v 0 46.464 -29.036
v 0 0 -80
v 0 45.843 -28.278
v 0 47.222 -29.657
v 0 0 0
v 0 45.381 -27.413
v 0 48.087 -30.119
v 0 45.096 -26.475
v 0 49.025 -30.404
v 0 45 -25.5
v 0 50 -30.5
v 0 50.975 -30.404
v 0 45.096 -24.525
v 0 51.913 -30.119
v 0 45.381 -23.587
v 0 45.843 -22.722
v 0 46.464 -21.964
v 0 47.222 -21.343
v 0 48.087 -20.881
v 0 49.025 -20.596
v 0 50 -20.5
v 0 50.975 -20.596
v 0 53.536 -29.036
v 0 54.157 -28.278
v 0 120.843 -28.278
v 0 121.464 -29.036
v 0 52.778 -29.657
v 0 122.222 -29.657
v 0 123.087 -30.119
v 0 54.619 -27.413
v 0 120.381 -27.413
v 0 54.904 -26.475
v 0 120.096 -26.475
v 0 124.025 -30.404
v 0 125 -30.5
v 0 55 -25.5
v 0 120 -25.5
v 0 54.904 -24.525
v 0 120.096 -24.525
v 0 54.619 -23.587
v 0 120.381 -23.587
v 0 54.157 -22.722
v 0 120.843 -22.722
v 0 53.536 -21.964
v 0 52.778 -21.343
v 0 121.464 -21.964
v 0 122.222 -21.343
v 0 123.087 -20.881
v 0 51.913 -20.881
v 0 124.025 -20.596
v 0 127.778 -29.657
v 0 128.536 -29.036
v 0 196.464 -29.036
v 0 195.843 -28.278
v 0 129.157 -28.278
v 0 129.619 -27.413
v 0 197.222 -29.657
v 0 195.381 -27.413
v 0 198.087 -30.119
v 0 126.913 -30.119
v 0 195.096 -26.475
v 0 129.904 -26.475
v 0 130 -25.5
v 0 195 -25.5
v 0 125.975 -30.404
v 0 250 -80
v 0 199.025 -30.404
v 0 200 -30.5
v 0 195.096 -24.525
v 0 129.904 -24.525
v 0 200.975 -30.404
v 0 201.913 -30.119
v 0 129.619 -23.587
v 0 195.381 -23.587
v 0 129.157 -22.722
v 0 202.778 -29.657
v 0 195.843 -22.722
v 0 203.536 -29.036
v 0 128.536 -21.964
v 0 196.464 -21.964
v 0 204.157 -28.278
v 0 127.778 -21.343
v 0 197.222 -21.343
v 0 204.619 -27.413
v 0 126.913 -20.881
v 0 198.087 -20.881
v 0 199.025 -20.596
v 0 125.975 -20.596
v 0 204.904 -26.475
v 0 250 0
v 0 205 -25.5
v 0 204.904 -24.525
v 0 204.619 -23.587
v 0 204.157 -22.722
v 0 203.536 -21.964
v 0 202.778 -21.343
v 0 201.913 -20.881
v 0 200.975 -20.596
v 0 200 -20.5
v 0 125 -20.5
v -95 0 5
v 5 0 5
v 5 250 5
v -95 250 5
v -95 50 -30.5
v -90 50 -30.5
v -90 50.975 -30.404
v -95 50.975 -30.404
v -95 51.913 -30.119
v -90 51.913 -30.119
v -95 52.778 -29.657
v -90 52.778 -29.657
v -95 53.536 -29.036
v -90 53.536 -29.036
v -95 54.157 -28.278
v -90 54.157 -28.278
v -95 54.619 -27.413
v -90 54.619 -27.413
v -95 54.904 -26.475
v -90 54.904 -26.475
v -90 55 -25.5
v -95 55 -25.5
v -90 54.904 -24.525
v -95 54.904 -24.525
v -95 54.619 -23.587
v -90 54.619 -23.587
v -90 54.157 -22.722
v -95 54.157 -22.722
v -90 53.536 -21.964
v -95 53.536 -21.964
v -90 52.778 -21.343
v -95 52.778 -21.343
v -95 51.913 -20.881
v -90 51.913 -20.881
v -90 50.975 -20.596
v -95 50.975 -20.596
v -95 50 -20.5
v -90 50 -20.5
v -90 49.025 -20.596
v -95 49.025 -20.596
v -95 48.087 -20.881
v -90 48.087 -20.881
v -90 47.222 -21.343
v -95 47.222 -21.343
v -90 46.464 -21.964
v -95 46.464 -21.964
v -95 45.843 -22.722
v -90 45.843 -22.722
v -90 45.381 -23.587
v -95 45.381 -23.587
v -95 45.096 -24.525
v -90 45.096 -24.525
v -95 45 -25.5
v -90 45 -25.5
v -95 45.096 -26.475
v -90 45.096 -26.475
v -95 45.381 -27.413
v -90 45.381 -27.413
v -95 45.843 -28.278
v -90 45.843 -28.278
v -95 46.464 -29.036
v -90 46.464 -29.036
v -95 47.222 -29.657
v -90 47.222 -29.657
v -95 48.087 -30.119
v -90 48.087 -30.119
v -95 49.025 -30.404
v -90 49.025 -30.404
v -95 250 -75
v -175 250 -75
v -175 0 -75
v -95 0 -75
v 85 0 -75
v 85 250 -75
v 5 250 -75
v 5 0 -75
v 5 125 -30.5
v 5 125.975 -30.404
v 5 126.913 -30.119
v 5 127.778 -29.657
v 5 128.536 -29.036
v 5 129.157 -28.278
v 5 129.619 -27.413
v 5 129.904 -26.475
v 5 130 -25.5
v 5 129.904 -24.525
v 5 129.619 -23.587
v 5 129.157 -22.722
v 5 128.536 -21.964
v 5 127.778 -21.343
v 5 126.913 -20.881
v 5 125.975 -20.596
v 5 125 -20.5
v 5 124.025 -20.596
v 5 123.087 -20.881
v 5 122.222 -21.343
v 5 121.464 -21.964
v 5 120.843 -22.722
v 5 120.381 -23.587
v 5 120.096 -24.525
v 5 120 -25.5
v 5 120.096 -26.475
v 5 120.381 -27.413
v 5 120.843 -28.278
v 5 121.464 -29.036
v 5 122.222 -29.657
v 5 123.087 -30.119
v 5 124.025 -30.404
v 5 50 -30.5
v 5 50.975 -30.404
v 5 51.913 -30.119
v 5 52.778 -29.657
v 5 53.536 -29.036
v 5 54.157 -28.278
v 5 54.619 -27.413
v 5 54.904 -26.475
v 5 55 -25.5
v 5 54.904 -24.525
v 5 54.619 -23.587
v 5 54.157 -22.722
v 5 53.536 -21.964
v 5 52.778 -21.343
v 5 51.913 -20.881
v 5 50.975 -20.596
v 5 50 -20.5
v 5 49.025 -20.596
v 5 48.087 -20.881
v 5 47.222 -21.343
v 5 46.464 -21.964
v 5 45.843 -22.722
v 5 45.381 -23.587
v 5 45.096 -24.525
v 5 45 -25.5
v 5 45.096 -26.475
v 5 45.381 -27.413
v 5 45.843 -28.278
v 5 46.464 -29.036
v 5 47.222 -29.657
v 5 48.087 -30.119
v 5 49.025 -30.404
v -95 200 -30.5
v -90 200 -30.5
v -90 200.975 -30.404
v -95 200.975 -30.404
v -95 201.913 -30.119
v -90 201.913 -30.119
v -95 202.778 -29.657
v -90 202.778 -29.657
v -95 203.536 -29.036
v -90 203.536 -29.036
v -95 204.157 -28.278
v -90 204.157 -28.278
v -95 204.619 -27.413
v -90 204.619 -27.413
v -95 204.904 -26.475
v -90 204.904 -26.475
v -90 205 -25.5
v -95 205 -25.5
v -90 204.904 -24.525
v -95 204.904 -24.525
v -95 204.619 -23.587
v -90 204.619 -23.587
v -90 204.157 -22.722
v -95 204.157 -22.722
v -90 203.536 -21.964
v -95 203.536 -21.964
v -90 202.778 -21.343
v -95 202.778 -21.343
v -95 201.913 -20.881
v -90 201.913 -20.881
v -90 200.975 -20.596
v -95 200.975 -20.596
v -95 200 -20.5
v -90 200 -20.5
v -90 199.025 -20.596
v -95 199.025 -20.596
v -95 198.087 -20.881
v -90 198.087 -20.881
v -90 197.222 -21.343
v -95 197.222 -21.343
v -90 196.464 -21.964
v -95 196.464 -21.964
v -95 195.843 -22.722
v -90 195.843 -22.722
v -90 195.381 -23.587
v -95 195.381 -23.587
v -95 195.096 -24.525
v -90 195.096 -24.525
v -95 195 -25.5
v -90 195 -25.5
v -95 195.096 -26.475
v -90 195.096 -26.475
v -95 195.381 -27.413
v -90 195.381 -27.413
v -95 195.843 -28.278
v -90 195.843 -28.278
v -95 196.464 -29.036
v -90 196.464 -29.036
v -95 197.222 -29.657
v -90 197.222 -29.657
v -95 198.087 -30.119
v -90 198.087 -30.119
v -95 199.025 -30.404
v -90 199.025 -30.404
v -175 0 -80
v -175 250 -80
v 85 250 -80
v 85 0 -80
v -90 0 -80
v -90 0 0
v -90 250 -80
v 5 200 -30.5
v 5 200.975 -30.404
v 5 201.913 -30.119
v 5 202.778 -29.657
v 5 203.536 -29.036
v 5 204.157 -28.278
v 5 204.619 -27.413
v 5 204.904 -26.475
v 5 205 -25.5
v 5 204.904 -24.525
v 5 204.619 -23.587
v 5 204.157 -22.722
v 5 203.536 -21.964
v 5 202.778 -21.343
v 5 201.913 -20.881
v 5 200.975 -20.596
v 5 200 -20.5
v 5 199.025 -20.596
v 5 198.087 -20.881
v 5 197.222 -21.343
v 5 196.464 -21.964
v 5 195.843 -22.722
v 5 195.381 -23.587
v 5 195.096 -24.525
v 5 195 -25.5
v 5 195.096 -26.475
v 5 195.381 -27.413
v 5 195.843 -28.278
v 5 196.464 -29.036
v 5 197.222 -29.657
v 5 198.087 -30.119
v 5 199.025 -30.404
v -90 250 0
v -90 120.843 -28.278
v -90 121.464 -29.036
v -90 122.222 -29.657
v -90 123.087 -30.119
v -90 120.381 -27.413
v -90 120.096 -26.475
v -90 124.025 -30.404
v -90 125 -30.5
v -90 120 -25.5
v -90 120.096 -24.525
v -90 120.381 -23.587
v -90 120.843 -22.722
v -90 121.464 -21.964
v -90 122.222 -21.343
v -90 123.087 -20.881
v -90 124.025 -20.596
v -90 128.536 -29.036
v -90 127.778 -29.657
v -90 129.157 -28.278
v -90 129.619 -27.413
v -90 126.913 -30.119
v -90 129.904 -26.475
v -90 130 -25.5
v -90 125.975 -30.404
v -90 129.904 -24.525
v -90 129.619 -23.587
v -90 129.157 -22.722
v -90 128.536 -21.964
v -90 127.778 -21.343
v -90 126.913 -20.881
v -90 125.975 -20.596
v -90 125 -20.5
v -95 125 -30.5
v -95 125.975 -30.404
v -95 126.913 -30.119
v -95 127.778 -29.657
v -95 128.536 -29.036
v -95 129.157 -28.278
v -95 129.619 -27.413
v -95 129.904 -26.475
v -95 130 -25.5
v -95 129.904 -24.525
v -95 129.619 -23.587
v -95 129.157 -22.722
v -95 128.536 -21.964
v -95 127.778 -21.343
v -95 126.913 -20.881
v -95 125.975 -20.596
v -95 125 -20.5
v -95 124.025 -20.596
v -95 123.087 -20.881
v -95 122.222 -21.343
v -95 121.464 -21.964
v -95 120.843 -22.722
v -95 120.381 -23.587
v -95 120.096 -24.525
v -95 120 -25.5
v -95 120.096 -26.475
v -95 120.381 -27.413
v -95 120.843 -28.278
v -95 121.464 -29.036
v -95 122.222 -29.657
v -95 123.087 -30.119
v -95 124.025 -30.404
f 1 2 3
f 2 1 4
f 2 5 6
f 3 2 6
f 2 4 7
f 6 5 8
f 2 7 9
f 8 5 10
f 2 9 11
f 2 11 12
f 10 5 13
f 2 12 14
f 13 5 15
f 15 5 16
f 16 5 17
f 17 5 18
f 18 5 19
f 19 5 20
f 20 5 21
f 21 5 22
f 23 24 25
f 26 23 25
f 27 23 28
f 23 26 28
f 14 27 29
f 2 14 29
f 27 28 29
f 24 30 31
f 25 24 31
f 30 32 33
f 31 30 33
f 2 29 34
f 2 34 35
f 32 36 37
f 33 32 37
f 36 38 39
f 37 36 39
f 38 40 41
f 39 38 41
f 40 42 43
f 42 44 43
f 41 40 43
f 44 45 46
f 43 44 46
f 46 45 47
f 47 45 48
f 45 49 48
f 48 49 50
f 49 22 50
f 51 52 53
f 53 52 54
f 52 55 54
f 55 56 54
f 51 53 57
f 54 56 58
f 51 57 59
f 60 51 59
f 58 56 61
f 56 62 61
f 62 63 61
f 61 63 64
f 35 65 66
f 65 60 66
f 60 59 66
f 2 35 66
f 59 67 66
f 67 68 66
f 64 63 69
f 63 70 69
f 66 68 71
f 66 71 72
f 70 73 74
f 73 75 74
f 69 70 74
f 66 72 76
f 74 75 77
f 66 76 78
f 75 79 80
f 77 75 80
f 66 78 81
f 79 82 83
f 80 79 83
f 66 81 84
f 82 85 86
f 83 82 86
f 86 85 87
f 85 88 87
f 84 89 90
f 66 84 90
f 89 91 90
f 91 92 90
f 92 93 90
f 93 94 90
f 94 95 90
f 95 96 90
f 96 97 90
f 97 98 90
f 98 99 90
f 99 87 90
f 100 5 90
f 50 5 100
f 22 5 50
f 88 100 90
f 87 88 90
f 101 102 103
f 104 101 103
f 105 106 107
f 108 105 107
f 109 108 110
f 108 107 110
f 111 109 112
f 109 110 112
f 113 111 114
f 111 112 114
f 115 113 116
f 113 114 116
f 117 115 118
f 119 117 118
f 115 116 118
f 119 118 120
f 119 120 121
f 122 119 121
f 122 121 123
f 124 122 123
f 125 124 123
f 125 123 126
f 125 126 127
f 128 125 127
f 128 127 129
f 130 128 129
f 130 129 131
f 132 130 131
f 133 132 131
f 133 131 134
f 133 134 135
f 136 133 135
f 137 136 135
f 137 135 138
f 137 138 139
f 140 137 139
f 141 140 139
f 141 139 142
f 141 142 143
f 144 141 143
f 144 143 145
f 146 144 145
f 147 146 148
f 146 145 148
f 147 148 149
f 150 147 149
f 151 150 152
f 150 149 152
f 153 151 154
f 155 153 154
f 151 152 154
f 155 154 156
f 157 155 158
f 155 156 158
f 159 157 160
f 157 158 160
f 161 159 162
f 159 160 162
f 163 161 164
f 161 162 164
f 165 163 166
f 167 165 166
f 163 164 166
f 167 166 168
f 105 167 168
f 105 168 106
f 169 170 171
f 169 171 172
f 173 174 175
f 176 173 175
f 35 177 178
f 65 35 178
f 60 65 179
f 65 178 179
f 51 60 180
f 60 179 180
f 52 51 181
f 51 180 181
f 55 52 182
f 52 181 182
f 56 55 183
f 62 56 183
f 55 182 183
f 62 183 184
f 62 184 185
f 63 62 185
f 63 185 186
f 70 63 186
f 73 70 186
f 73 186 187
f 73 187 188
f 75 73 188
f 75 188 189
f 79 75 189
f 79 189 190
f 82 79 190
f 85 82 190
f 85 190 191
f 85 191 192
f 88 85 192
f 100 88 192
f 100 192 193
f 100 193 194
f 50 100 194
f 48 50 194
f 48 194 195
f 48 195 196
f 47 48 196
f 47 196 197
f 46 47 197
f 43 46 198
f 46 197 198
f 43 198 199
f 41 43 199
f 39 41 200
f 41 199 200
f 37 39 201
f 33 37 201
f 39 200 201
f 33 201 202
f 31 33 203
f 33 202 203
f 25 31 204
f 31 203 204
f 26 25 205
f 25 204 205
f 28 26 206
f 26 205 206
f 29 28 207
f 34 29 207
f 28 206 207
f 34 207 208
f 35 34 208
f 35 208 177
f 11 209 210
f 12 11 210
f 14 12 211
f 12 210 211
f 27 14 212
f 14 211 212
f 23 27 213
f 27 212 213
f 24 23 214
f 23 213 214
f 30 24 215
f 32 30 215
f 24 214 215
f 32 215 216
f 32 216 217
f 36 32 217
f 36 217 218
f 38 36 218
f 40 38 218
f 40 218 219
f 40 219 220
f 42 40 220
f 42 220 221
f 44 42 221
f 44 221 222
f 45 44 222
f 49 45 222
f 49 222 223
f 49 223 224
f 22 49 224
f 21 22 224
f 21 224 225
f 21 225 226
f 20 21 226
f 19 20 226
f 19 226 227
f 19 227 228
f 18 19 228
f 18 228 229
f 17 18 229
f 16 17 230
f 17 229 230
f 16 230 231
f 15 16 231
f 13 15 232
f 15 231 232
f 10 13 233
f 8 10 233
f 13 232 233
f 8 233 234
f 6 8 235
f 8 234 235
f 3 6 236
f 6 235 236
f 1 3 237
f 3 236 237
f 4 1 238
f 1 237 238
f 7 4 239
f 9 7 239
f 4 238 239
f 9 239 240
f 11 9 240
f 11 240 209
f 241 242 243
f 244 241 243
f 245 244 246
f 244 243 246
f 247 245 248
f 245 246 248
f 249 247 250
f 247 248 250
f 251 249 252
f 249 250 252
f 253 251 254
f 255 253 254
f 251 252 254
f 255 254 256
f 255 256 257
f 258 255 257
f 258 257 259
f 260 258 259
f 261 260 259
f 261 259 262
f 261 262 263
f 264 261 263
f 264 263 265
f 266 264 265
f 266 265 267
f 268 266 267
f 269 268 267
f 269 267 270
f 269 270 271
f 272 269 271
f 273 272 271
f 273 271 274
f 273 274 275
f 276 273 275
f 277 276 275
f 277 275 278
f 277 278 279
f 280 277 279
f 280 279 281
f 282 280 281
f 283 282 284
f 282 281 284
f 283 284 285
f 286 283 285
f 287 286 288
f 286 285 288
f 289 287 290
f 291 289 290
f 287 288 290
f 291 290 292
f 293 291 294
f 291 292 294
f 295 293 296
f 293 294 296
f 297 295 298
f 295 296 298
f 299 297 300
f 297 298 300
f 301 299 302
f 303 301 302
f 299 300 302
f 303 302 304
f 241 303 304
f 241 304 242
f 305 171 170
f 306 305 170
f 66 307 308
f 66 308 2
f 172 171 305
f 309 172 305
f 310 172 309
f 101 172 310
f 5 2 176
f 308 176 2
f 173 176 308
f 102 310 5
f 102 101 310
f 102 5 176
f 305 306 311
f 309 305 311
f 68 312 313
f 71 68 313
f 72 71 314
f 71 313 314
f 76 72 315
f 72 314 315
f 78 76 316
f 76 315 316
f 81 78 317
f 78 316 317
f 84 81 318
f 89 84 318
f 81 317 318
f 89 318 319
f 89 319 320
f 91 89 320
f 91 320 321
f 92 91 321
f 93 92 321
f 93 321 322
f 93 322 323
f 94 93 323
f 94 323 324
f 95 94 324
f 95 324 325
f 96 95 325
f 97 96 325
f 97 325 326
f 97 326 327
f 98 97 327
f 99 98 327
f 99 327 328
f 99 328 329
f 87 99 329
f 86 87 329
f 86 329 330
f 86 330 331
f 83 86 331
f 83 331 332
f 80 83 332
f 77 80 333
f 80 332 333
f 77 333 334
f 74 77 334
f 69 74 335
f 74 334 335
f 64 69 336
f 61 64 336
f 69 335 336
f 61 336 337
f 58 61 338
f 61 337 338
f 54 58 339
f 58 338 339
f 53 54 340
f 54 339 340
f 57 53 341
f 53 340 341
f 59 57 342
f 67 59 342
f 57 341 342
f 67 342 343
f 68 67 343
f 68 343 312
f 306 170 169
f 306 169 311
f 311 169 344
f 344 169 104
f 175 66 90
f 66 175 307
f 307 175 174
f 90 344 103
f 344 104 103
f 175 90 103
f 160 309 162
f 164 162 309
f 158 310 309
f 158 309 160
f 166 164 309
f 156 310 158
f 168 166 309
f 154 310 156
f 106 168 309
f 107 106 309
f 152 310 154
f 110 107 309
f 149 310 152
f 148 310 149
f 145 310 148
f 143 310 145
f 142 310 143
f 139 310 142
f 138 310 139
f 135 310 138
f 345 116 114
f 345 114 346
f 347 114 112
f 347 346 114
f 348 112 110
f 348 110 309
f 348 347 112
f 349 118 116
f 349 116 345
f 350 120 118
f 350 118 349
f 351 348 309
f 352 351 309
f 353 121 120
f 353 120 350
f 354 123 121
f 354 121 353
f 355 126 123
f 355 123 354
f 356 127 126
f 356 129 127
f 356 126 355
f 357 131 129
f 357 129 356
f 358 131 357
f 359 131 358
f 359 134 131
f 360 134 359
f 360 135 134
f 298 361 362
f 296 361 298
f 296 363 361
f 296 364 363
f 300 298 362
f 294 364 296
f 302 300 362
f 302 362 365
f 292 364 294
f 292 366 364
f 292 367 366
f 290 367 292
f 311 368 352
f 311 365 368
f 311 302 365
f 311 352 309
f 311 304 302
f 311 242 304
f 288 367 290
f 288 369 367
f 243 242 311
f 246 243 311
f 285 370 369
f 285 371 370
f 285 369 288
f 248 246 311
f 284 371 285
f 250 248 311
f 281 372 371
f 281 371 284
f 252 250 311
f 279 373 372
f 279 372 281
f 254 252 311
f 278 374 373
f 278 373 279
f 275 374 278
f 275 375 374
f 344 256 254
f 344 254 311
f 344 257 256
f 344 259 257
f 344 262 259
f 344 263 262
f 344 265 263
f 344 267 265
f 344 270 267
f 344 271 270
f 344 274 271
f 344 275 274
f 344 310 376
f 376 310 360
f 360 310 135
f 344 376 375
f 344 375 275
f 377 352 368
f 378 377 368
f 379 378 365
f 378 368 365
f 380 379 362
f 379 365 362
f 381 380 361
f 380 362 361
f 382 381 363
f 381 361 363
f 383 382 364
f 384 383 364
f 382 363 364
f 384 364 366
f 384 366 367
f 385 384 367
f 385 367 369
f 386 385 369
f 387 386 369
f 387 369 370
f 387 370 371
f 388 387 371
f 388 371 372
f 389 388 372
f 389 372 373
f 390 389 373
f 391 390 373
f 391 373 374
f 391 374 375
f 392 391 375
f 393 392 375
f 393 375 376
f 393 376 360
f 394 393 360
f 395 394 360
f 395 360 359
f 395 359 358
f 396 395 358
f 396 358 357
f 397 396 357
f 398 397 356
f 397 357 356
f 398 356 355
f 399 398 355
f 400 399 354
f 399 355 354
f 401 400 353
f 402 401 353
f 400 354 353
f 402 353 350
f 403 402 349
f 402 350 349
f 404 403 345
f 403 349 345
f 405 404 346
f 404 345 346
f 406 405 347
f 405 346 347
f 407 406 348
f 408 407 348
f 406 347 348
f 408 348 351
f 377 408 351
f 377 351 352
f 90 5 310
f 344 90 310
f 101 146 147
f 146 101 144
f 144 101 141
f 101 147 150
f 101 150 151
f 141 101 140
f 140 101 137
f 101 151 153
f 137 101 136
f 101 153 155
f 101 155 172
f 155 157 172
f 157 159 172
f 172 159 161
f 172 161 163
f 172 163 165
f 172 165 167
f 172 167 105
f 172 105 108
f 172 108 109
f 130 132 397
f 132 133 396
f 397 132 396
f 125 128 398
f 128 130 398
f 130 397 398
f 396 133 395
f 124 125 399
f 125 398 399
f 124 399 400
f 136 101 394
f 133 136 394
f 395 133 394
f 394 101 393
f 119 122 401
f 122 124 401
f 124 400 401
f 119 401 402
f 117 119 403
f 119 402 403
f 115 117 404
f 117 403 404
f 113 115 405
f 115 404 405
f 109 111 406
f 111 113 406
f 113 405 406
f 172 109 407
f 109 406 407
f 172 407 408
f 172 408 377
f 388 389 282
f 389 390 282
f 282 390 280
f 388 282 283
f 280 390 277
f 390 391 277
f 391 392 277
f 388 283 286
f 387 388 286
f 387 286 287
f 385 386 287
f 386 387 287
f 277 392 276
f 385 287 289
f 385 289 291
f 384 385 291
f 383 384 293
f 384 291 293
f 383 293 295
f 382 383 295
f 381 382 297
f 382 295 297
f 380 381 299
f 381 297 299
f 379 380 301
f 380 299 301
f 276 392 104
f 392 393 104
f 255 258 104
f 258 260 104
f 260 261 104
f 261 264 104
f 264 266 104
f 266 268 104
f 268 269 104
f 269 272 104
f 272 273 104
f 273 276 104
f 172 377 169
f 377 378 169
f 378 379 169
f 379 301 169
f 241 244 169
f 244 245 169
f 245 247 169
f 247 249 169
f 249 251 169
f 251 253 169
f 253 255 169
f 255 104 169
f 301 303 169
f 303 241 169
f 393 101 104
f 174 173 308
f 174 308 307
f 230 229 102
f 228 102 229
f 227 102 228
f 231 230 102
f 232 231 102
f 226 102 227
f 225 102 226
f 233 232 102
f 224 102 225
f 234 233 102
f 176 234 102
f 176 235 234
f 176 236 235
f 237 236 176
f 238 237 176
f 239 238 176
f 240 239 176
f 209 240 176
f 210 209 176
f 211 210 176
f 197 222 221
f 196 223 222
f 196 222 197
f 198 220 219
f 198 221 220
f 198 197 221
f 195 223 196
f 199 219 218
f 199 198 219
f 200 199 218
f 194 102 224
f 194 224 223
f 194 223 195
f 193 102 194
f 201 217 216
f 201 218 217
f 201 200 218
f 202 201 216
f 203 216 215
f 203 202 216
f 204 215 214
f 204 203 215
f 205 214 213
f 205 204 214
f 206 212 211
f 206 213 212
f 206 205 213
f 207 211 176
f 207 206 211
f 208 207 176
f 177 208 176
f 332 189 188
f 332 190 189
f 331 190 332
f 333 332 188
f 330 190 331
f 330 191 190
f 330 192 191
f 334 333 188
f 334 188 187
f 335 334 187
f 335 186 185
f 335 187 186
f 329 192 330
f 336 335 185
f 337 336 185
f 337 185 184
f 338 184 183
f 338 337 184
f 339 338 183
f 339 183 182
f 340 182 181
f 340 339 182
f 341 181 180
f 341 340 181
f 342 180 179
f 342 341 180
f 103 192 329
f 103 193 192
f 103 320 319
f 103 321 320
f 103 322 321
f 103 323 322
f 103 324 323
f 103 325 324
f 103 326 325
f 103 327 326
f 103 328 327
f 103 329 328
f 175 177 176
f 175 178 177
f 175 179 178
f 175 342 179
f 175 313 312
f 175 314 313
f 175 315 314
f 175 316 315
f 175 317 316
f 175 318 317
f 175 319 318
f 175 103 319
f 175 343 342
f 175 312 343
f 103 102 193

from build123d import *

# Parameters (mm, degrees)
ESQUISSE1_W             = 45
ESQUISSE1_H             = 250
BOSS_EXTRU_1_DEPTH      = 5
ESQUISSE2_W             = 80
ESQUISSE2_H             = 250
BOSS_EXTRU_2_DEPTH      = 5
ESQUISSE4_W             = 85
ESQUISSE4_H             = 250
BOSS_EXTRU_4_DEPTH      = 5
ESQUISSE5_R             = 5
ENL_V_MAT_EXTRU_1_DEPTH = 181


with BuildPart() as part:
    # Esquisse1 → Boss.-Extru.1 (new body)
    with BuildSketch(Plane.XY):
        with Locations((-22.5, 125)):
            Rectangle(ESQUISSE1_W, ESQUISSE1_H)
    boss_extru_1 = extrude(amount=BOSS_EXTRU_1_DEPTH)

    # Esquisse2 → Boss.-Extru.2 (add)
    with BuildSketch(Plane(origin=(0, 0, 0), x_dir=(0, 0, -1), z_dir=(1, 0, 0))):
        with Locations((35, 125)):
            Rectangle(ESQUISSE2_W, ESQUISSE2_H)
    boss_extru_2 = extrude(amount=BOSS_EXTRU_2_DEPTH)

    # Esquisse4 → Boss.-Extru.4 (add)
    with BuildSketch(Plane(origin=(0, 0, -75), x_dir=(-1, 0, 0), z_dir=(0, 0, -1))):
        with Locations((-42.5, 125)):
            Rectangle(ESQUISSE4_W, ESQUISSE4_H)
    boss_extru_4 = extrude(amount=BOSS_EXTRU_4_DEPTH)

    # Symétrie1: Boss.-Extru.1, Boss.-Extru.2, Boss.-Extru.4 across plane
    add(boss_extru_1.mirror(Plane(origin=(-45, 0, 5), x_dir=(0, 0, 1), z_dir=(1, 0, 0))))
    add(boss_extru_2.mirror(Plane(origin=(-45, 0, 5), x_dir=(0, 0, 1), z_dir=(1, 0, 0))))
    add(boss_extru_4.mirror(Plane(origin=(-45, 0, 5), x_dir=(0, 0, 1), z_dir=(1, 0, 0))))

    # Esquisse5 → Enlèv. mat.-Extru.1 (cut, through all)
    with BuildSketch(Plane(origin=(5, 0, 0), x_dir=(0, 0, -1), z_dir=(1, 0, 0))):
        with Locations((25.5, 125)):
            Circle(ESQUISSE5_R)
        with Locations((25.5, 200)):
            Circle(ESQUISSE5_R)
        with Locations((25.5, 50)):
            Circle(ESQUISSE5_R)
    extrude(amount=-ENL_V_MAT_EXTRU_1_DEPTH, mode=Mode.SUBTRACT)


solid = part.part
